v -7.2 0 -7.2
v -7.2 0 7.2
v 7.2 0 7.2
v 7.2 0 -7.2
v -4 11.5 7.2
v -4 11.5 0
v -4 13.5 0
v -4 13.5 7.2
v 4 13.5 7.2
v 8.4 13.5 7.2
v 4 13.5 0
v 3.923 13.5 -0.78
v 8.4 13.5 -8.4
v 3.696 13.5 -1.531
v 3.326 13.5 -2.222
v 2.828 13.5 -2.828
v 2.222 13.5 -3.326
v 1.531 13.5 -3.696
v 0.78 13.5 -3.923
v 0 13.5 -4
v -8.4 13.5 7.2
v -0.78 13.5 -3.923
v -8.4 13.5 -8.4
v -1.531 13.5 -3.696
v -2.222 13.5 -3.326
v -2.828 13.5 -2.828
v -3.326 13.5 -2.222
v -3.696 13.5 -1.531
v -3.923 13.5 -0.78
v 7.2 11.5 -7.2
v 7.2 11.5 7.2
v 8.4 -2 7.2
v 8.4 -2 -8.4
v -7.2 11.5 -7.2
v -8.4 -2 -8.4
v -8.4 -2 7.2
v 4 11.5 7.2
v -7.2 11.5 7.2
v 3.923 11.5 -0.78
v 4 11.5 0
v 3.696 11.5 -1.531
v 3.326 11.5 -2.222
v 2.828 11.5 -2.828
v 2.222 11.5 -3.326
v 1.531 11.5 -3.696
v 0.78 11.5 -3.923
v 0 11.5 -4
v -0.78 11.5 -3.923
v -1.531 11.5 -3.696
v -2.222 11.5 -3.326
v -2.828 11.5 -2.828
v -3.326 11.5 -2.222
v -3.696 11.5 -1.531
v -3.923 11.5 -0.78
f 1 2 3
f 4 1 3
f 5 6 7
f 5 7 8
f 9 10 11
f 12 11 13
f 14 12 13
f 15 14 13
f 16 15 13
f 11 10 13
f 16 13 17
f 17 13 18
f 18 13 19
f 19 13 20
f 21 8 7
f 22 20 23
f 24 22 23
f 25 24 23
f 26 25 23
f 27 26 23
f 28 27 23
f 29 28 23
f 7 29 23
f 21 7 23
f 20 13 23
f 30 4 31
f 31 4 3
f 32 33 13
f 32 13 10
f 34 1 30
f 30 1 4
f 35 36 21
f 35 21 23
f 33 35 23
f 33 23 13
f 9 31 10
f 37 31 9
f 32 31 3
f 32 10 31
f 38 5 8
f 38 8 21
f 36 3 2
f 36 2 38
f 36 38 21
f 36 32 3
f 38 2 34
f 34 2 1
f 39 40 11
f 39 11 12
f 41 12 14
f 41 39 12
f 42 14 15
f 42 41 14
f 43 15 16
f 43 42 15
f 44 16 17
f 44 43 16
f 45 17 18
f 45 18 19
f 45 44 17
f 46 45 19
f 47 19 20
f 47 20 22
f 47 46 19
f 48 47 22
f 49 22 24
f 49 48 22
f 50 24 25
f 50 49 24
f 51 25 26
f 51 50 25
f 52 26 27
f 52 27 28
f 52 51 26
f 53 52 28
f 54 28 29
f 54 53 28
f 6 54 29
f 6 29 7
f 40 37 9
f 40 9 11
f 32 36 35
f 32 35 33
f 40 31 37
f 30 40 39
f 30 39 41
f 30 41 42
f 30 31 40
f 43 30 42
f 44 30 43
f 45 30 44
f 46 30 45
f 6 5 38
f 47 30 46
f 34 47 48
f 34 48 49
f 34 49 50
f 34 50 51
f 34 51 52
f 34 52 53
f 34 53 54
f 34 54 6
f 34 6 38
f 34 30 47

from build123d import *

# Parameters (mm, degrees)
BOSS_EXTRUDE1_DEPTH = 11.5
SKETCH2_W           = 16.8
SKETCH2_H           = 15.6
BOSS_EXTRUDE2_DEPTH = 2
BOSS_EXTRUDE3_DEPTH = 2


with BuildPart() as part:
    # Sketch1 → Boss-Extrude1 (new body)
    with BuildSketch(Plane(origin=(0, 0, 0), x_dir=(1, 0, 0), z_dir=(0, 1, 0))):
        Polygon((-8.4, 8.4), (-8.4, -7.2), (-7.2, -7.2), (-7.2, 7.2), (7.2, 7.2), (7.2, -7.2), (8.4, -7.2), (8.4, 8.4), align=None)
    extrude(amount=BOSS_EXTRUDE1_DEPTH)

    # Sketch2 → Boss-Extrude2 (add)
    with BuildSketch(Plane.XZ):
        with Locations((0, -0.6)):
            Rectangle(SKETCH2_W, SKETCH2_H)
    extrude(amount=BOSS_EXTRUDE2_DEPTH)

    # Sketch3 → Boss-Extrude3 (add)
    with BuildSketch(Plane(origin=(0, 11.5, 0), x_dir=(1, 0, 0), z_dir=(0, 1, 0))):
        with BuildLine():
            Line((-4, 0), (-4, -7.2))
            Line((-4, -7.2), (-8.4, -7.2))
            Line((-8.4, -7.2), (-8.4, 8.4))
            Line((-8.4, 8.4), (8.4, 8.4))
            Line((8.4, 8.4), (8.4, -7.2))
            Line((8.4, -7.2), (4, -7.2))
            Line((4, -7.2), (4, 0))
            ThreePointArc((4, 0), (0, 4), (-4, 0))
        make_face()
    extrude(amount=BOSS_EXTRUDE3_DEPTH)


solid = part.part
